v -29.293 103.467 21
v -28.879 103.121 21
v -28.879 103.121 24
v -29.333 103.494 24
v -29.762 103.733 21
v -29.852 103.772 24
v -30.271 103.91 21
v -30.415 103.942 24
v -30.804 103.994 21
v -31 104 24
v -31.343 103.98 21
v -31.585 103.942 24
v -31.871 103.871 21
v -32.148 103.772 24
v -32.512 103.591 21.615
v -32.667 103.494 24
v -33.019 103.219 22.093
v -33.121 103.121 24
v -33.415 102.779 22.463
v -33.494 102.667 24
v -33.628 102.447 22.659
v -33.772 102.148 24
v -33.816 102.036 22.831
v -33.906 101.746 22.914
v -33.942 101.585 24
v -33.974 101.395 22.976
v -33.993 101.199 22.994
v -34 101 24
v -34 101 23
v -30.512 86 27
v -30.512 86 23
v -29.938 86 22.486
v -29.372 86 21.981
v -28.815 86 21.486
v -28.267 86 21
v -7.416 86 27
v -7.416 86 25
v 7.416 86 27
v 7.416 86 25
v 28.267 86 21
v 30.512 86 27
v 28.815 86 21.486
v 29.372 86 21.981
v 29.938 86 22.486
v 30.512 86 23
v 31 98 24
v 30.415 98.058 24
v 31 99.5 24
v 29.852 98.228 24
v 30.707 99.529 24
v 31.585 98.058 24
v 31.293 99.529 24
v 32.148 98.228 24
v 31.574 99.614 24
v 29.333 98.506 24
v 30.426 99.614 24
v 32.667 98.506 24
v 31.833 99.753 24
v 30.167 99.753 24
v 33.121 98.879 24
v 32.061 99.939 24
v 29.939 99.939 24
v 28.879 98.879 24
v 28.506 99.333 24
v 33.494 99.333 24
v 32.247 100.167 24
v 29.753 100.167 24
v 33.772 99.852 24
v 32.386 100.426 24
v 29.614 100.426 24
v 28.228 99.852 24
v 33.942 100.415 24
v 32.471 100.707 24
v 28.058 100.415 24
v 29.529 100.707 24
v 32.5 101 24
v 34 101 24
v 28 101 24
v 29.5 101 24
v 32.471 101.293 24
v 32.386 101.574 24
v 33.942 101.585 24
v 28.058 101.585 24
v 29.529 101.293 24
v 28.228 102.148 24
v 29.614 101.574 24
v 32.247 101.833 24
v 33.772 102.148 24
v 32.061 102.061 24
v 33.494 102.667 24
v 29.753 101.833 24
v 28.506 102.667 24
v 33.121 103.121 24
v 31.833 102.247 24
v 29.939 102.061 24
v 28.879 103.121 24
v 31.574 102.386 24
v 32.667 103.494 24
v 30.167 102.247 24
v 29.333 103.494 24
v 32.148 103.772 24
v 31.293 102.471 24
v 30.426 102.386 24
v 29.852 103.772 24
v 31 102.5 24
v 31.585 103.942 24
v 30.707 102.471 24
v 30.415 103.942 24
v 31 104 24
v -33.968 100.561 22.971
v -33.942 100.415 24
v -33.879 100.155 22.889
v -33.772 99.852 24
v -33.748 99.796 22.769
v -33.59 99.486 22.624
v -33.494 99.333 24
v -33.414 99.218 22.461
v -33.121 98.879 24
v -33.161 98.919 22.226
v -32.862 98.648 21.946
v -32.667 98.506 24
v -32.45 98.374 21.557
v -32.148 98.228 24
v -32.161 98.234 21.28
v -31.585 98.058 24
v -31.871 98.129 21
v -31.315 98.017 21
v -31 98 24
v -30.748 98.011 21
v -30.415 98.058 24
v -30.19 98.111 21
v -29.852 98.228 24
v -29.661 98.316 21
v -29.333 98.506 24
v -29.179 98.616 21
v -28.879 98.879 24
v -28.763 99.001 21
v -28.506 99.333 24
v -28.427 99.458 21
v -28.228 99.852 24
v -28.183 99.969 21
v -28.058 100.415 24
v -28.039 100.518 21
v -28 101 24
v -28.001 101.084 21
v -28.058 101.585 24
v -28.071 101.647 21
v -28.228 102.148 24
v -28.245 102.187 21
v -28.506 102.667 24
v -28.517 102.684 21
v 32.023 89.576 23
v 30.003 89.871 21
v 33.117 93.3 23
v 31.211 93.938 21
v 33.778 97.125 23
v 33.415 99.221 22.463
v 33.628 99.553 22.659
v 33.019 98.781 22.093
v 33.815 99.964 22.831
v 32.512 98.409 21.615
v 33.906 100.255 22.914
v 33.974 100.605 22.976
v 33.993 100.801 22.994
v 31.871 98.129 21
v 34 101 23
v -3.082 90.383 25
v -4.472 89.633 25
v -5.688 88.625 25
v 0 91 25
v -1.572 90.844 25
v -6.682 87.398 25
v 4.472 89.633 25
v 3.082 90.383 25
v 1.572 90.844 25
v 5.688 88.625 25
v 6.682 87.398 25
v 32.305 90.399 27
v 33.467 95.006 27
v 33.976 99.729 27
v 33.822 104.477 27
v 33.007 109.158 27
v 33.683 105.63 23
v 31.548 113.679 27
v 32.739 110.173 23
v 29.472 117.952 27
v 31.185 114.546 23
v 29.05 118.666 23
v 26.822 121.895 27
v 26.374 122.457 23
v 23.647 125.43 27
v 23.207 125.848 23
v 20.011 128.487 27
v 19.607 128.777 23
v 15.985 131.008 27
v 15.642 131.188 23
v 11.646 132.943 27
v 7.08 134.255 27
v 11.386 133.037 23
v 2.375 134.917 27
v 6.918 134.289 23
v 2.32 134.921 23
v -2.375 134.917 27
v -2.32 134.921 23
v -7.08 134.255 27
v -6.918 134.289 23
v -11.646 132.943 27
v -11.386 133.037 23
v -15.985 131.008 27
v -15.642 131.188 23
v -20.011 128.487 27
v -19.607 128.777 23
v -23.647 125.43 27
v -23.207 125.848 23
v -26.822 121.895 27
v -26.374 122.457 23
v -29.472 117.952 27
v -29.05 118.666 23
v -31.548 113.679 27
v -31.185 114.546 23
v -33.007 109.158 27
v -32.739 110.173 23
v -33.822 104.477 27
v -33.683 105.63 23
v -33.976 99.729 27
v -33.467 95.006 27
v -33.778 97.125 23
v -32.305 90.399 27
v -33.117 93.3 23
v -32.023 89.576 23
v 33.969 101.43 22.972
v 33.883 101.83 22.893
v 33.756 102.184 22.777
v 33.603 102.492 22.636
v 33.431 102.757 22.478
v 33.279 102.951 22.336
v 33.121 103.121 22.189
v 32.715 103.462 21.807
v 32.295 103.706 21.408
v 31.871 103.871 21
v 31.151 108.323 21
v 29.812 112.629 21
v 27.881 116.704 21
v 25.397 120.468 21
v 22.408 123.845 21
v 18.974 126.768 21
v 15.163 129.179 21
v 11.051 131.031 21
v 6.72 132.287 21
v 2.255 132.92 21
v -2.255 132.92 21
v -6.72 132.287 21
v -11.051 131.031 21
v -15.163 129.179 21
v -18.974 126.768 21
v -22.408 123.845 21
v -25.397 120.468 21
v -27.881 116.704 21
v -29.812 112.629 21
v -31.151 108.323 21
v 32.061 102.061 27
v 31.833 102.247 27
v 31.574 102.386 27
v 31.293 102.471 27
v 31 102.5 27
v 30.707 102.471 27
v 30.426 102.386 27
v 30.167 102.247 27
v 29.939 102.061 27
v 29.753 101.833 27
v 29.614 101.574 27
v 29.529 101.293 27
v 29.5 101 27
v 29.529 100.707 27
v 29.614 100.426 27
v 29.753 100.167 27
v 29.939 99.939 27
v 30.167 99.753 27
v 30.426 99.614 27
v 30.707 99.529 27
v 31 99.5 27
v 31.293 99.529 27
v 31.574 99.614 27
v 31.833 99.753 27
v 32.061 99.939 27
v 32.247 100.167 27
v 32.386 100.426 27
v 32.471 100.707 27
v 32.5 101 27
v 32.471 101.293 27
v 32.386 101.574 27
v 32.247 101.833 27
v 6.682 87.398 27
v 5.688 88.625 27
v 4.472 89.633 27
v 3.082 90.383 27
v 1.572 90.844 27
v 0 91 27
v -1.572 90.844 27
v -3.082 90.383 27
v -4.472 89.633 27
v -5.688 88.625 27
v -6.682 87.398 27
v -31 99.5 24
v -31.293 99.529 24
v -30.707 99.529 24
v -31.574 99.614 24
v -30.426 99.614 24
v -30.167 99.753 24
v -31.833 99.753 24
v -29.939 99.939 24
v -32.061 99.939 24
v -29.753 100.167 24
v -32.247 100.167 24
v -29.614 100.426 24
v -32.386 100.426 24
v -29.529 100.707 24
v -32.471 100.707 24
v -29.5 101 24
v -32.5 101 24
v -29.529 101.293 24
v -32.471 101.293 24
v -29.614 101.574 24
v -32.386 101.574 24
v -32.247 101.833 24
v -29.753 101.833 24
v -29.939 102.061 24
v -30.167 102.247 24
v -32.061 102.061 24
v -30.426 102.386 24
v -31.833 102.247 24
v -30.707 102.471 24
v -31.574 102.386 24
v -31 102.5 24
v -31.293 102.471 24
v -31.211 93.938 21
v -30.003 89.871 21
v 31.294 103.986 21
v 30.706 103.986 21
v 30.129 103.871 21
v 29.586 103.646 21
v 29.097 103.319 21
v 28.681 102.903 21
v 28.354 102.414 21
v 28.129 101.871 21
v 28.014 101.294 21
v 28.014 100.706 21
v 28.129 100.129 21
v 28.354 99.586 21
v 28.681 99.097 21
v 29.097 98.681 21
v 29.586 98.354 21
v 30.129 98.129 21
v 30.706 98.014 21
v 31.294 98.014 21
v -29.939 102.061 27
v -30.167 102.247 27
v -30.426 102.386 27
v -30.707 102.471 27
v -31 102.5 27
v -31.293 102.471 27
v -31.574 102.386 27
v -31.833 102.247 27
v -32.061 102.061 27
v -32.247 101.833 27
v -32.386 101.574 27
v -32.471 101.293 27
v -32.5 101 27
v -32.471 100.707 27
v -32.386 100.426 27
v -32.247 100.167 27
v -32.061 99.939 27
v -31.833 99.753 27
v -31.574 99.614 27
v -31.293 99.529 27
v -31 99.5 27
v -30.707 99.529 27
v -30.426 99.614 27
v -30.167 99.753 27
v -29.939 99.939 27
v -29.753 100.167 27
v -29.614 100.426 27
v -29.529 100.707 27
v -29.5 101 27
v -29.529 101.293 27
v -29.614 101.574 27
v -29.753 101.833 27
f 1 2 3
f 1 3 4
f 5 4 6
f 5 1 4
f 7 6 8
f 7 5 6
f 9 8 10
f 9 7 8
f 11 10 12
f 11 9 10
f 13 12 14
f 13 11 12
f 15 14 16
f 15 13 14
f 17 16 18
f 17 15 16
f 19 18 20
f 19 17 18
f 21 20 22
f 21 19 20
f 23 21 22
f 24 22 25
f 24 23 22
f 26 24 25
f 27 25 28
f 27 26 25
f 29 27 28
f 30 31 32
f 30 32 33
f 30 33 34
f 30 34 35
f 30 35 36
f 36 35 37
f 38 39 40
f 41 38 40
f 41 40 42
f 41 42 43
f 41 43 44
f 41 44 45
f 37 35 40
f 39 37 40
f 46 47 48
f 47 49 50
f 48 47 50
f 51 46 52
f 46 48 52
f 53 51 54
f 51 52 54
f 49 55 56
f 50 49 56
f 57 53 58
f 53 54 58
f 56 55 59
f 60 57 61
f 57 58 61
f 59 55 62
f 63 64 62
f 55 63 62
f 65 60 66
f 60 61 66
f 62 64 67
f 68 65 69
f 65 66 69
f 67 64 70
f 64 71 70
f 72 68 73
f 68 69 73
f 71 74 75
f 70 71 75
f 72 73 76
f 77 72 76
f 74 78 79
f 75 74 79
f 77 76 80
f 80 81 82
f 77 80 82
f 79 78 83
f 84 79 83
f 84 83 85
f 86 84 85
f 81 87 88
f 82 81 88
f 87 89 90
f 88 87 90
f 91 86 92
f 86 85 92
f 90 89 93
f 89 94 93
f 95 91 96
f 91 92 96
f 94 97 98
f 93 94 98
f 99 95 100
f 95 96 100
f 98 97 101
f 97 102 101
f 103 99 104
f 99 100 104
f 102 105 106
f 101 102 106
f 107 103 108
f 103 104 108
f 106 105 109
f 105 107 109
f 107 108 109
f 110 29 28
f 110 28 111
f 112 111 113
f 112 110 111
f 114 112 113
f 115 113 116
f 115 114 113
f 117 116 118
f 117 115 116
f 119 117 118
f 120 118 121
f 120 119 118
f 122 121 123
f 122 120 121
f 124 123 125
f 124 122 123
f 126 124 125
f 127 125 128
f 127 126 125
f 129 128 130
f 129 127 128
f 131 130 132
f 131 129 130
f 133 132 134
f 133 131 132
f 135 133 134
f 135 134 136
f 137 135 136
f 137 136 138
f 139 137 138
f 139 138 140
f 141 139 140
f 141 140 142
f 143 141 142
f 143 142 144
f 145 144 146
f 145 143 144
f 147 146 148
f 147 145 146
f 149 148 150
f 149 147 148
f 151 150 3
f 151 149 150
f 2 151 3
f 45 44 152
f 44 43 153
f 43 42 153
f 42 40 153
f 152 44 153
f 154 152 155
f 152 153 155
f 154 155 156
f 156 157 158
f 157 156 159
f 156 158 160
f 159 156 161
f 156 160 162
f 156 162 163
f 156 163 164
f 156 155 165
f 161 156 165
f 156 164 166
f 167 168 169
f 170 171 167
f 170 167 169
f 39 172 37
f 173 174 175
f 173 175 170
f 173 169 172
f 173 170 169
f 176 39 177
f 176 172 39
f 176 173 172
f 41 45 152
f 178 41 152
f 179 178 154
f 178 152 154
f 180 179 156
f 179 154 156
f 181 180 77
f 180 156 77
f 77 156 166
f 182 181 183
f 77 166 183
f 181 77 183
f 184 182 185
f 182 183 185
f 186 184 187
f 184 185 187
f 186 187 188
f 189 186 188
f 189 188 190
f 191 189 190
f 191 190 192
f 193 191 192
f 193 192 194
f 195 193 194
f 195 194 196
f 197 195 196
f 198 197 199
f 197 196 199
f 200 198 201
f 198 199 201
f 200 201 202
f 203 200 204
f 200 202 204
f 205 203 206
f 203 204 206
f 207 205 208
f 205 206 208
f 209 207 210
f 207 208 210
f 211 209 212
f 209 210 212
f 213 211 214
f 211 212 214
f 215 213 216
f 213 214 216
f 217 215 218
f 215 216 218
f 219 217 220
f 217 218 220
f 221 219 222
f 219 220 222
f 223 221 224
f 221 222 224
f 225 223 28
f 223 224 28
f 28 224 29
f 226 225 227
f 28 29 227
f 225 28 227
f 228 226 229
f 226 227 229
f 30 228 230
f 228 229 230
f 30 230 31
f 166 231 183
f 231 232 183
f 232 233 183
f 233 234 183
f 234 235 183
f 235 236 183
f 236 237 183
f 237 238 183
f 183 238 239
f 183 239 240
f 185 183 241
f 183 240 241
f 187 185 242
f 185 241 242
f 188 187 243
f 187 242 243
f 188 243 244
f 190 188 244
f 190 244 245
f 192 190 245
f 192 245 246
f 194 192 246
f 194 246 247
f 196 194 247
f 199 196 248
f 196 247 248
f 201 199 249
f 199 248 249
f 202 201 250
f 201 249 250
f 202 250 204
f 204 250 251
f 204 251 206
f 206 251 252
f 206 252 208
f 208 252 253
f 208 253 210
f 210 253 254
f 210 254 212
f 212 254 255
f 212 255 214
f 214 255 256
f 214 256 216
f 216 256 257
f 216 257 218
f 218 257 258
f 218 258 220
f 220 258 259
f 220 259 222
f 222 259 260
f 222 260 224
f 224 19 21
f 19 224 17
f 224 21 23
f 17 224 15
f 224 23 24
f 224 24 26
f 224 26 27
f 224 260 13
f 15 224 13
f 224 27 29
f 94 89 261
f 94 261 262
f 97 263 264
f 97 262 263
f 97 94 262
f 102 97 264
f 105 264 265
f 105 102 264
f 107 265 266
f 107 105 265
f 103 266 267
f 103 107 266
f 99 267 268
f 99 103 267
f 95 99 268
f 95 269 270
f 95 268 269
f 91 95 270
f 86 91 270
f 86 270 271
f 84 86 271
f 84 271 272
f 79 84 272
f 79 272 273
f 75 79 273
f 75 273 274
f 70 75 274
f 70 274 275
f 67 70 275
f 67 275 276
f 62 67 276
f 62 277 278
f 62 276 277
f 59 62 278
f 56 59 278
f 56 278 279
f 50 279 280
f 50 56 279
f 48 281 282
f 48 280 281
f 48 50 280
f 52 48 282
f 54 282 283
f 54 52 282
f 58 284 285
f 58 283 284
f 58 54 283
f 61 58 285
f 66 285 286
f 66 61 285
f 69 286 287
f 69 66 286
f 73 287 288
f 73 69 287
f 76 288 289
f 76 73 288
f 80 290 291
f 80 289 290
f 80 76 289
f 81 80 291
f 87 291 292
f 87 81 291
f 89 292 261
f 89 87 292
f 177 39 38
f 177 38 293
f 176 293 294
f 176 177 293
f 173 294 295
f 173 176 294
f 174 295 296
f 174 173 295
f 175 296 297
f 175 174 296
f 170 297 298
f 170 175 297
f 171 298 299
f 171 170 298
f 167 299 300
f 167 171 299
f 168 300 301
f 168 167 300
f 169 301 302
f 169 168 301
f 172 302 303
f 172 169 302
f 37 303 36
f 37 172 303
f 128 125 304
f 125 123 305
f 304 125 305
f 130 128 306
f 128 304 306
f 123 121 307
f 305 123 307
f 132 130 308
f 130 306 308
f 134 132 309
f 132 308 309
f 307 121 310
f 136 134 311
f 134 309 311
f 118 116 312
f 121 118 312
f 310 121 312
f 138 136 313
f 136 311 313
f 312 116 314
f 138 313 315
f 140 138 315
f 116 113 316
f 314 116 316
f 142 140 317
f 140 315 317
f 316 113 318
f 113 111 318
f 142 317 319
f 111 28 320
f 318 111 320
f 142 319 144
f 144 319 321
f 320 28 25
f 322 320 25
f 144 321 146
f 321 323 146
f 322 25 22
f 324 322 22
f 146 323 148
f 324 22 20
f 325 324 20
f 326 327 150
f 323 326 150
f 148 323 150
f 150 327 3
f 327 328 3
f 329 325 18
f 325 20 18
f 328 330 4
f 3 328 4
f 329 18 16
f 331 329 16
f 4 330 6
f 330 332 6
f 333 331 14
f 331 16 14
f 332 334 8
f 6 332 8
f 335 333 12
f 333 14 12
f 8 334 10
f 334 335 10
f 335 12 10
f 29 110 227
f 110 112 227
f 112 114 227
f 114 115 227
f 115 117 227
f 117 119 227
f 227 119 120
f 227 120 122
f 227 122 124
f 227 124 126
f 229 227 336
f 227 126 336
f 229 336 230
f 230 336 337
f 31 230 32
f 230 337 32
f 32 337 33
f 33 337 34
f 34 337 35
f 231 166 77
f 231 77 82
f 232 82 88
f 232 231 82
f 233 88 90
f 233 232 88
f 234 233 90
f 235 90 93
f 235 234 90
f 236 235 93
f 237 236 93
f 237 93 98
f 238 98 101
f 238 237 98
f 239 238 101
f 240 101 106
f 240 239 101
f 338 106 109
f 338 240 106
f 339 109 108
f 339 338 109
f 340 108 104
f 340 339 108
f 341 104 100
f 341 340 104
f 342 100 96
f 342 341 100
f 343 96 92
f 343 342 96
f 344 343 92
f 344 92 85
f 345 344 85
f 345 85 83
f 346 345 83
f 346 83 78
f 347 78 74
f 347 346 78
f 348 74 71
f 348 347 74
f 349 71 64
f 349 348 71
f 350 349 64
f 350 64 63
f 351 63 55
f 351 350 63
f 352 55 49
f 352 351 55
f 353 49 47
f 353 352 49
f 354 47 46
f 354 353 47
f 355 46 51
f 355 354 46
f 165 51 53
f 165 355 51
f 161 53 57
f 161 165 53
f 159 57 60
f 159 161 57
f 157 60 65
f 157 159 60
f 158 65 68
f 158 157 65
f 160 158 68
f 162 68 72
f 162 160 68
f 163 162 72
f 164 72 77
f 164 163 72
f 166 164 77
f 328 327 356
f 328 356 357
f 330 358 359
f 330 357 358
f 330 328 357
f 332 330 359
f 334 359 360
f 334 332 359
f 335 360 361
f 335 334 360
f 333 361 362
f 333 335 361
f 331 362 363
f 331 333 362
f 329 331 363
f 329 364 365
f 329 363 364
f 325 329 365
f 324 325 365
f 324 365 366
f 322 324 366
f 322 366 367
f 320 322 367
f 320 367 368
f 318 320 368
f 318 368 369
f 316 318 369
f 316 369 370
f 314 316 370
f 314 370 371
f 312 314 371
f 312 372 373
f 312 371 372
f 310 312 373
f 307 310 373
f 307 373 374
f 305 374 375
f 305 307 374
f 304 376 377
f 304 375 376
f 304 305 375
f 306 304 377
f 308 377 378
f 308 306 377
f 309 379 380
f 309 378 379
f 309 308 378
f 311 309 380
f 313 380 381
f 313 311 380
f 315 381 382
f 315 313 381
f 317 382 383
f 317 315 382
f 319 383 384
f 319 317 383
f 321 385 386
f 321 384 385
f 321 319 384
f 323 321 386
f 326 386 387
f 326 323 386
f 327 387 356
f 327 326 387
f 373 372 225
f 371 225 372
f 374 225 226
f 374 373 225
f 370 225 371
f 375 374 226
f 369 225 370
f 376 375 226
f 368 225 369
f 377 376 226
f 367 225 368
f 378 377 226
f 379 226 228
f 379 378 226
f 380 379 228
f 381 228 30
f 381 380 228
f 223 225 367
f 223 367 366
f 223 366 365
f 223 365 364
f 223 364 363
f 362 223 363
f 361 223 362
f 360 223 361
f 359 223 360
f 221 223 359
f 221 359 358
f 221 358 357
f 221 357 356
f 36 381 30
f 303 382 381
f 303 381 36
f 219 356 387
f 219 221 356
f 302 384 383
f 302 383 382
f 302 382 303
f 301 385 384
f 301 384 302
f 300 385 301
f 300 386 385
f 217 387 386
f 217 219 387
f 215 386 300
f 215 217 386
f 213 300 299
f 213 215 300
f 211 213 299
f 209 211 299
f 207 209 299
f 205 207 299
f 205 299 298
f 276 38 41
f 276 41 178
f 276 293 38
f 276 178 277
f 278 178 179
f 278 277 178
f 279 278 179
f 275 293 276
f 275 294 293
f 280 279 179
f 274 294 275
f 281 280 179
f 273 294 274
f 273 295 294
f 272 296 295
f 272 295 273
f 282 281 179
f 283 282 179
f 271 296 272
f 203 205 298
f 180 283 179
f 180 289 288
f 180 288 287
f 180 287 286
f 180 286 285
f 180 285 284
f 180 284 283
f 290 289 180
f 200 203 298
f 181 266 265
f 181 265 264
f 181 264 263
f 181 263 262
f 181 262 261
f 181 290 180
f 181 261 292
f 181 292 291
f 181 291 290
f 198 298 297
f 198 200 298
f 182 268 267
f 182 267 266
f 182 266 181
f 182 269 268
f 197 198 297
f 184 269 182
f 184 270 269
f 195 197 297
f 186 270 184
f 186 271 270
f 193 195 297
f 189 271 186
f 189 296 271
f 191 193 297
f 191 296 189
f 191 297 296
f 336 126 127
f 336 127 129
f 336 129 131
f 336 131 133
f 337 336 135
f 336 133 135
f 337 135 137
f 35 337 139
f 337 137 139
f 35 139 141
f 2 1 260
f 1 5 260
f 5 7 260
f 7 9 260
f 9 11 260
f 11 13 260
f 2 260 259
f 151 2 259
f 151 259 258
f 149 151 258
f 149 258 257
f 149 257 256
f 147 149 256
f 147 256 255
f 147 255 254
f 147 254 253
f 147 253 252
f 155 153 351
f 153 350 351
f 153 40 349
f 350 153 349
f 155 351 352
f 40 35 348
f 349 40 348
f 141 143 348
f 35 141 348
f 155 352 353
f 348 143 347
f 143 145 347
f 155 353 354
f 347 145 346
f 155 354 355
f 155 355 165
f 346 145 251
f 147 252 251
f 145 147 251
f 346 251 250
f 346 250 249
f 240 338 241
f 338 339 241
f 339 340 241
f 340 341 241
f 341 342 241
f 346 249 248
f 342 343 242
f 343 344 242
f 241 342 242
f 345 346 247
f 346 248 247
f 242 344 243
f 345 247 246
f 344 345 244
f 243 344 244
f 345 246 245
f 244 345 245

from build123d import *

# Parameters (mm, degrees)
CYLINDER1964_R               = 1.5
CYLINDER1964_DEPTH           = 50
CYLINDER1964_PLACEMENT_ANGLE = 45
CYLINDER1965_R               = 1.5
CYLINDER1965_DEPTH           = 50
CYLINDER1965_PLACEMENT_ANGLE = 45
CYLINDER1963_R               = 1.5
CYLINDER1963_DEPTH           = 50
CYLINDER1963_PLACEMENT_ANGLE = 45
CYLINDER1962_R               = 1.5
CYLINDER1962_DEPTH           = 50
CYLINDER1962_PLACEMENT_ANGLE = 45
CYLINDER1967_R               = 1.5
CYLINDER1967_DEPTH           = 50
CYLINDER1967_PLACEMENT_ANGLE = 45
CYLINDER1966_R               = 1.5
CYLINDER1966_DEPTH           = 50
CYLINDER1966_PLACEMENT_ANGLE = 45
CYLINDER1954_R               = 3
CYLINDER1954_DEPTH           = 3
CYLINDER1954_PLACEMENT_ANGLE = 45
CYLINDER1953_R               = 3
CYLINDER1953_DEPTH           = 3
CYLINDER1953_PLACEMENT_ANGLE = 45
CYLINDER1955_R               = 3
CYLINDER1955_DEPTH           = 3
CYLINDER1955_PLACEMENT_ANGLE = 45
CYLINDER1952_R               = 3
CYLINDER1952_DEPTH           = 3
CYLINDER1952_PLACEMENT_ANGLE = 45
CYLINDER1950_R               = 3
CYLINDER1950_DEPTH           = 3
CYLINDER1950_PLACEMENT_ANGLE = 45
CYLINDER1951_R               = 3
CYLINDER1951_DEPTH           = 3
CYLINDER1951_PLACEMENT_ANGLE = 45
CYLINDER1936_R               = 8
CYLINDER1936_DEPTH           = 6
BOX803_W                     = 148
BOX803_H                     = 40
BOX803_DEPTH                 = 40
CYLINDER1935_R               = 34
CYLINDER1935_DEPTH           = 6
CHAMFER065_SIZE              = 2


with BuildPart() as v_lec1964:
    # Cylinder1964 → Cylinder1964 (new body)
    with BuildSketch(Plane.XY):
        Circle(CYLINDER1964_R)
    extrude(amount=CYLINDER1964_DEPTH)


with BuildPart() as v_lec1964_1:
    # Cylinder1964 placement: moved
    add(v_lec1964.part.moved(Location((20, 137, 0))).rotate(Axis((20, 137, 0), (0, 0, 1)), CYLINDER1964_PLACEMENT_ANGLE))


with BuildPart() as compound991:
    # Cylinder1965 → Cylinder1965 (new body)
    with BuildSketch(Plane.XY):
        Circle(CYLINDER1965_R)
    extrude(amount=CYLINDER1965_DEPTH)


with BuildPart() as compound991_1:
    # Cylinder1965 placement: moved
    add(compound991.part.moved(Location((-20, 137, 0))).rotate(Axis((-20, 137, 0), (0, 0, 1)), CYLINDER1965_PLACEMENT_ANGLE))

    # Compound991: union Válec1964
    add(v_lec1964_1.part)


with BuildPart() as v_lec1963:
    # Cylinder1963 → Cylinder1963 (new body)
    with BuildSketch(Plane.XY):
        Circle(CYLINDER1963_R)
    extrude(amount=CYLINDER1963_DEPTH)


with BuildPart() as v_lec1963_1:
    # Cylinder1963 placement: moved
    add(v_lec1963.part.moved(Location((31, 131, 0))).rotate(Axis((31, 131, 0), (0, 0, 1)), CYLINDER1963_PLACEMENT_ANGLE))


with BuildPart() as compound992:
    # Cylinder1962 → Cylinder1962 (new body)
    with BuildSketch(Plane.XY):
        Circle(CYLINDER1962_R)
    extrude(amount=CYLINDER1962_DEPTH)


with BuildPart() as compound992_1:
    # Cylinder1962 placement: moved
    add(compound992.part.moved(Location((-31, 131, 0))).rotate(Axis((-31, 131, 0), (0, 0, 1)), CYLINDER1962_PLACEMENT_ANGLE))

    # Compound992: union Válec1963
    add(v_lec1963_1.part)


with BuildPart() as v_lec1967:
    # Cylinder1967 → Cylinder1967 (new body)
    with BuildSketch(Plane.XY):
        Circle(CYLINDER1967_R)
    extrude(amount=CYLINDER1967_DEPTH)


with BuildPart() as v_lec1967_1:
    # Cylinder1967 placement: moved
    add(v_lec1967.part.moved(Location((31, 101, 0))).rotate(Axis((31, 101, 0), (0, 0, 1)), CYLINDER1967_PLACEMENT_ANGLE))


with BuildPart() as compound994:
    # Cylinder1966 → Cylinder1966 (new body)
    with BuildSketch(Plane.XY):
        Circle(CYLINDER1966_R)
    extrude(amount=CYLINDER1966_DEPTH)


with BuildPart() as compound994_1:
    # Cylinder1966 placement: moved
    add(compound994.part.moved(Location((-31, 101, 0))).rotate(Axis((-31, 101, 0), (0, 0, 1)), CYLINDER1966_PLACEMENT_ANGLE))

    # Compound993: union Válec1967
    add(v_lec1967_1.part)

    # Compound994: union Compound991, Compound992
    add(compound991_1.part)
    add(compound992_1.part)


with BuildPart() as v_lec1954:
    # Cylinder1954 → Cylinder1954 (new body)
    with BuildSketch(Plane.XY):
        Circle(CYLINDER1954_R)
    extrude(amount=CYLINDER1954_DEPTH)


with BuildPart() as v_lec1954_1:
    # Cylinder1954 placement: moved
    add(v_lec1954.part.moved(Location((31, 131, 0))).rotate(Axis((31, 131, 0), (0, 0, 1)), CYLINDER1954_PLACEMENT_ANGLE))


with BuildPart() as compound982:
    # Cylinder1953 → Cylinder1953 (new body)
    with BuildSketch(Plane.XY):
        Circle(CYLINDER1953_R)
    extrude(amount=CYLINDER1953_DEPTH)


with BuildPart() as compound982_1:
    # Cylinder1953 placement: moved
    add(compound982.part.moved(Location((-31, 131, 0))).rotate(Axis((-31, 131, 0), (0, 0, 1)), CYLINDER1953_PLACEMENT_ANGLE))

    # Compound982: union Válec1954
    add(v_lec1954_1.part)


with BuildPart() as compound982_2:
    # Compound982 placement: moved
    add(compound982_1.part.moved(Location((0, 0, 25))))


with BuildPart() as v_lec1955:
    # Cylinder1955 → Cylinder1955 (new body)
    with BuildSketch(Plane.XY):
        Circle(CYLINDER1955_R)
    extrude(amount=CYLINDER1955_DEPTH)


with BuildPart() as v_lec1955_1:
    # Cylinder1955 placement: moved
    add(v_lec1955.part.moved(Location((31, 101, 0))).rotate(Axis((31, 101, 0), (0, 0, 1)), CYLINDER1955_PLACEMENT_ANGLE))


with BuildPart() as compound984:
    # Cylinder1952 → Cylinder1952 (new body)
    with BuildSketch(Plane.XY):
        Circle(CYLINDER1952_R)
    extrude(amount=CYLINDER1952_DEPTH)


with BuildPart() as compound984_1:
    # Cylinder1952 placement: moved
    add(compound984.part.moved(Location((-31, 101, 0))).rotate(Axis((-31, 101, 0), (0, 0, 1)), CYLINDER1952_PLACEMENT_ANGLE))

    # Compound984: union Válec1955
    add(v_lec1955_1.part)


with BuildPart() as compound984_2:
    # Compound984 placement: moved
    add(compound984_1.part.moved(Location((0, 0, 21))))


with BuildPart() as v_lec1950:
    # Cylinder1950 → Cylinder1950 (new body)
    with BuildSketch(Plane.XY):
        Circle(CYLINDER1950_R)
    extrude(amount=CYLINDER1950_DEPTH)


with BuildPart() as v_lec1950_1:
    # Cylinder1950 placement: moved
    add(v_lec1950.part.moved(Location((20, 137, 0))).rotate(Axis((20, 137, 0), (0, 0, 1)), CYLINDER1950_PLACEMENT_ANGLE))


with BuildPart() as compound985:
    # Cylinder1951 → Cylinder1951 (new body)
    with BuildSketch(Plane.XY):
        Circle(CYLINDER1951_R)
    extrude(amount=CYLINDER1951_DEPTH)


with BuildPart() as compound985_1:
    # Cylinder1951 placement: moved
    add(compound985.part.moved(Location((-20, 137, 0))).rotate(Axis((-20, 137, 0), (0, 0, 1)), CYLINDER1951_PLACEMENT_ANGLE))

    # Compound983: union Válec1950
    add(v_lec1950_1.part)


with BuildPart() as compound985_2:
    # Compound983 placement: moved
    add(compound985_1.part.moved(Location((0, 0, 25))))

    # Compound985: union Compound982, Compound984
    add(compound982_2.part)
    add(compound984_2.part)


with BuildPart() as v_lec1936:
    # Cylinder1936 → Cylinder1936 (new body)
    with BuildSketch(Plane(origin=(0, 83, 25), x_dir=(1, 0, 0), z_dir=(0, 0, 1))):
        Circle(CYLINDER1936_R)
    extrude(amount=CYLINDER1936_DEPTH)


with BuildPart() as krychle803:
    # Box803 → Box803 (new body)
    with BuildSketch(Plane(origin=(-74, 46, 16), x_dir=(1, 0, 0), z_dir=(0, 0, 1))):
        with Locations((74, 20)):
            Rectangle(BOX803_W, BOX803_H)
    extrude(amount=BOX803_DEPTH)


with BuildPart() as cut622:
    # Cylinder1935 → Cylinder1935 (new body)
    with BuildSketch(Plane(origin=(0, 101, 21), x_dir=(1, 0, 0), z_dir=(0, 0, 1))):
        Circle(CYLINDER1935_R)
    extrude(amount=CYLINDER1935_DEPTH)

    # Cut615: cut Krychle803
    add(krychle803.part, mode=Mode.SUBTRACT)

    # Cut616: cut Válec1936
    add(v_lec1936.part, mode=Mode.SUBTRACT)

    # Chamfer065
    chamfer065_edges = [cut622.edges().sort_by_distance(p)[0] for p in [
        (-7.700067, 134.116597, 21),
    ]]
    chamfer(chamfer065_edges, length=CHAMFER065_SIZE)

    # Cut619: cut Compound985
    add(compound985_2.part, mode=Mode.SUBTRACT)

    # Cut622: cut Compound994
    add(compound994_1.part, mode=Mode.SUBTRACT)


solid = cut622.part
